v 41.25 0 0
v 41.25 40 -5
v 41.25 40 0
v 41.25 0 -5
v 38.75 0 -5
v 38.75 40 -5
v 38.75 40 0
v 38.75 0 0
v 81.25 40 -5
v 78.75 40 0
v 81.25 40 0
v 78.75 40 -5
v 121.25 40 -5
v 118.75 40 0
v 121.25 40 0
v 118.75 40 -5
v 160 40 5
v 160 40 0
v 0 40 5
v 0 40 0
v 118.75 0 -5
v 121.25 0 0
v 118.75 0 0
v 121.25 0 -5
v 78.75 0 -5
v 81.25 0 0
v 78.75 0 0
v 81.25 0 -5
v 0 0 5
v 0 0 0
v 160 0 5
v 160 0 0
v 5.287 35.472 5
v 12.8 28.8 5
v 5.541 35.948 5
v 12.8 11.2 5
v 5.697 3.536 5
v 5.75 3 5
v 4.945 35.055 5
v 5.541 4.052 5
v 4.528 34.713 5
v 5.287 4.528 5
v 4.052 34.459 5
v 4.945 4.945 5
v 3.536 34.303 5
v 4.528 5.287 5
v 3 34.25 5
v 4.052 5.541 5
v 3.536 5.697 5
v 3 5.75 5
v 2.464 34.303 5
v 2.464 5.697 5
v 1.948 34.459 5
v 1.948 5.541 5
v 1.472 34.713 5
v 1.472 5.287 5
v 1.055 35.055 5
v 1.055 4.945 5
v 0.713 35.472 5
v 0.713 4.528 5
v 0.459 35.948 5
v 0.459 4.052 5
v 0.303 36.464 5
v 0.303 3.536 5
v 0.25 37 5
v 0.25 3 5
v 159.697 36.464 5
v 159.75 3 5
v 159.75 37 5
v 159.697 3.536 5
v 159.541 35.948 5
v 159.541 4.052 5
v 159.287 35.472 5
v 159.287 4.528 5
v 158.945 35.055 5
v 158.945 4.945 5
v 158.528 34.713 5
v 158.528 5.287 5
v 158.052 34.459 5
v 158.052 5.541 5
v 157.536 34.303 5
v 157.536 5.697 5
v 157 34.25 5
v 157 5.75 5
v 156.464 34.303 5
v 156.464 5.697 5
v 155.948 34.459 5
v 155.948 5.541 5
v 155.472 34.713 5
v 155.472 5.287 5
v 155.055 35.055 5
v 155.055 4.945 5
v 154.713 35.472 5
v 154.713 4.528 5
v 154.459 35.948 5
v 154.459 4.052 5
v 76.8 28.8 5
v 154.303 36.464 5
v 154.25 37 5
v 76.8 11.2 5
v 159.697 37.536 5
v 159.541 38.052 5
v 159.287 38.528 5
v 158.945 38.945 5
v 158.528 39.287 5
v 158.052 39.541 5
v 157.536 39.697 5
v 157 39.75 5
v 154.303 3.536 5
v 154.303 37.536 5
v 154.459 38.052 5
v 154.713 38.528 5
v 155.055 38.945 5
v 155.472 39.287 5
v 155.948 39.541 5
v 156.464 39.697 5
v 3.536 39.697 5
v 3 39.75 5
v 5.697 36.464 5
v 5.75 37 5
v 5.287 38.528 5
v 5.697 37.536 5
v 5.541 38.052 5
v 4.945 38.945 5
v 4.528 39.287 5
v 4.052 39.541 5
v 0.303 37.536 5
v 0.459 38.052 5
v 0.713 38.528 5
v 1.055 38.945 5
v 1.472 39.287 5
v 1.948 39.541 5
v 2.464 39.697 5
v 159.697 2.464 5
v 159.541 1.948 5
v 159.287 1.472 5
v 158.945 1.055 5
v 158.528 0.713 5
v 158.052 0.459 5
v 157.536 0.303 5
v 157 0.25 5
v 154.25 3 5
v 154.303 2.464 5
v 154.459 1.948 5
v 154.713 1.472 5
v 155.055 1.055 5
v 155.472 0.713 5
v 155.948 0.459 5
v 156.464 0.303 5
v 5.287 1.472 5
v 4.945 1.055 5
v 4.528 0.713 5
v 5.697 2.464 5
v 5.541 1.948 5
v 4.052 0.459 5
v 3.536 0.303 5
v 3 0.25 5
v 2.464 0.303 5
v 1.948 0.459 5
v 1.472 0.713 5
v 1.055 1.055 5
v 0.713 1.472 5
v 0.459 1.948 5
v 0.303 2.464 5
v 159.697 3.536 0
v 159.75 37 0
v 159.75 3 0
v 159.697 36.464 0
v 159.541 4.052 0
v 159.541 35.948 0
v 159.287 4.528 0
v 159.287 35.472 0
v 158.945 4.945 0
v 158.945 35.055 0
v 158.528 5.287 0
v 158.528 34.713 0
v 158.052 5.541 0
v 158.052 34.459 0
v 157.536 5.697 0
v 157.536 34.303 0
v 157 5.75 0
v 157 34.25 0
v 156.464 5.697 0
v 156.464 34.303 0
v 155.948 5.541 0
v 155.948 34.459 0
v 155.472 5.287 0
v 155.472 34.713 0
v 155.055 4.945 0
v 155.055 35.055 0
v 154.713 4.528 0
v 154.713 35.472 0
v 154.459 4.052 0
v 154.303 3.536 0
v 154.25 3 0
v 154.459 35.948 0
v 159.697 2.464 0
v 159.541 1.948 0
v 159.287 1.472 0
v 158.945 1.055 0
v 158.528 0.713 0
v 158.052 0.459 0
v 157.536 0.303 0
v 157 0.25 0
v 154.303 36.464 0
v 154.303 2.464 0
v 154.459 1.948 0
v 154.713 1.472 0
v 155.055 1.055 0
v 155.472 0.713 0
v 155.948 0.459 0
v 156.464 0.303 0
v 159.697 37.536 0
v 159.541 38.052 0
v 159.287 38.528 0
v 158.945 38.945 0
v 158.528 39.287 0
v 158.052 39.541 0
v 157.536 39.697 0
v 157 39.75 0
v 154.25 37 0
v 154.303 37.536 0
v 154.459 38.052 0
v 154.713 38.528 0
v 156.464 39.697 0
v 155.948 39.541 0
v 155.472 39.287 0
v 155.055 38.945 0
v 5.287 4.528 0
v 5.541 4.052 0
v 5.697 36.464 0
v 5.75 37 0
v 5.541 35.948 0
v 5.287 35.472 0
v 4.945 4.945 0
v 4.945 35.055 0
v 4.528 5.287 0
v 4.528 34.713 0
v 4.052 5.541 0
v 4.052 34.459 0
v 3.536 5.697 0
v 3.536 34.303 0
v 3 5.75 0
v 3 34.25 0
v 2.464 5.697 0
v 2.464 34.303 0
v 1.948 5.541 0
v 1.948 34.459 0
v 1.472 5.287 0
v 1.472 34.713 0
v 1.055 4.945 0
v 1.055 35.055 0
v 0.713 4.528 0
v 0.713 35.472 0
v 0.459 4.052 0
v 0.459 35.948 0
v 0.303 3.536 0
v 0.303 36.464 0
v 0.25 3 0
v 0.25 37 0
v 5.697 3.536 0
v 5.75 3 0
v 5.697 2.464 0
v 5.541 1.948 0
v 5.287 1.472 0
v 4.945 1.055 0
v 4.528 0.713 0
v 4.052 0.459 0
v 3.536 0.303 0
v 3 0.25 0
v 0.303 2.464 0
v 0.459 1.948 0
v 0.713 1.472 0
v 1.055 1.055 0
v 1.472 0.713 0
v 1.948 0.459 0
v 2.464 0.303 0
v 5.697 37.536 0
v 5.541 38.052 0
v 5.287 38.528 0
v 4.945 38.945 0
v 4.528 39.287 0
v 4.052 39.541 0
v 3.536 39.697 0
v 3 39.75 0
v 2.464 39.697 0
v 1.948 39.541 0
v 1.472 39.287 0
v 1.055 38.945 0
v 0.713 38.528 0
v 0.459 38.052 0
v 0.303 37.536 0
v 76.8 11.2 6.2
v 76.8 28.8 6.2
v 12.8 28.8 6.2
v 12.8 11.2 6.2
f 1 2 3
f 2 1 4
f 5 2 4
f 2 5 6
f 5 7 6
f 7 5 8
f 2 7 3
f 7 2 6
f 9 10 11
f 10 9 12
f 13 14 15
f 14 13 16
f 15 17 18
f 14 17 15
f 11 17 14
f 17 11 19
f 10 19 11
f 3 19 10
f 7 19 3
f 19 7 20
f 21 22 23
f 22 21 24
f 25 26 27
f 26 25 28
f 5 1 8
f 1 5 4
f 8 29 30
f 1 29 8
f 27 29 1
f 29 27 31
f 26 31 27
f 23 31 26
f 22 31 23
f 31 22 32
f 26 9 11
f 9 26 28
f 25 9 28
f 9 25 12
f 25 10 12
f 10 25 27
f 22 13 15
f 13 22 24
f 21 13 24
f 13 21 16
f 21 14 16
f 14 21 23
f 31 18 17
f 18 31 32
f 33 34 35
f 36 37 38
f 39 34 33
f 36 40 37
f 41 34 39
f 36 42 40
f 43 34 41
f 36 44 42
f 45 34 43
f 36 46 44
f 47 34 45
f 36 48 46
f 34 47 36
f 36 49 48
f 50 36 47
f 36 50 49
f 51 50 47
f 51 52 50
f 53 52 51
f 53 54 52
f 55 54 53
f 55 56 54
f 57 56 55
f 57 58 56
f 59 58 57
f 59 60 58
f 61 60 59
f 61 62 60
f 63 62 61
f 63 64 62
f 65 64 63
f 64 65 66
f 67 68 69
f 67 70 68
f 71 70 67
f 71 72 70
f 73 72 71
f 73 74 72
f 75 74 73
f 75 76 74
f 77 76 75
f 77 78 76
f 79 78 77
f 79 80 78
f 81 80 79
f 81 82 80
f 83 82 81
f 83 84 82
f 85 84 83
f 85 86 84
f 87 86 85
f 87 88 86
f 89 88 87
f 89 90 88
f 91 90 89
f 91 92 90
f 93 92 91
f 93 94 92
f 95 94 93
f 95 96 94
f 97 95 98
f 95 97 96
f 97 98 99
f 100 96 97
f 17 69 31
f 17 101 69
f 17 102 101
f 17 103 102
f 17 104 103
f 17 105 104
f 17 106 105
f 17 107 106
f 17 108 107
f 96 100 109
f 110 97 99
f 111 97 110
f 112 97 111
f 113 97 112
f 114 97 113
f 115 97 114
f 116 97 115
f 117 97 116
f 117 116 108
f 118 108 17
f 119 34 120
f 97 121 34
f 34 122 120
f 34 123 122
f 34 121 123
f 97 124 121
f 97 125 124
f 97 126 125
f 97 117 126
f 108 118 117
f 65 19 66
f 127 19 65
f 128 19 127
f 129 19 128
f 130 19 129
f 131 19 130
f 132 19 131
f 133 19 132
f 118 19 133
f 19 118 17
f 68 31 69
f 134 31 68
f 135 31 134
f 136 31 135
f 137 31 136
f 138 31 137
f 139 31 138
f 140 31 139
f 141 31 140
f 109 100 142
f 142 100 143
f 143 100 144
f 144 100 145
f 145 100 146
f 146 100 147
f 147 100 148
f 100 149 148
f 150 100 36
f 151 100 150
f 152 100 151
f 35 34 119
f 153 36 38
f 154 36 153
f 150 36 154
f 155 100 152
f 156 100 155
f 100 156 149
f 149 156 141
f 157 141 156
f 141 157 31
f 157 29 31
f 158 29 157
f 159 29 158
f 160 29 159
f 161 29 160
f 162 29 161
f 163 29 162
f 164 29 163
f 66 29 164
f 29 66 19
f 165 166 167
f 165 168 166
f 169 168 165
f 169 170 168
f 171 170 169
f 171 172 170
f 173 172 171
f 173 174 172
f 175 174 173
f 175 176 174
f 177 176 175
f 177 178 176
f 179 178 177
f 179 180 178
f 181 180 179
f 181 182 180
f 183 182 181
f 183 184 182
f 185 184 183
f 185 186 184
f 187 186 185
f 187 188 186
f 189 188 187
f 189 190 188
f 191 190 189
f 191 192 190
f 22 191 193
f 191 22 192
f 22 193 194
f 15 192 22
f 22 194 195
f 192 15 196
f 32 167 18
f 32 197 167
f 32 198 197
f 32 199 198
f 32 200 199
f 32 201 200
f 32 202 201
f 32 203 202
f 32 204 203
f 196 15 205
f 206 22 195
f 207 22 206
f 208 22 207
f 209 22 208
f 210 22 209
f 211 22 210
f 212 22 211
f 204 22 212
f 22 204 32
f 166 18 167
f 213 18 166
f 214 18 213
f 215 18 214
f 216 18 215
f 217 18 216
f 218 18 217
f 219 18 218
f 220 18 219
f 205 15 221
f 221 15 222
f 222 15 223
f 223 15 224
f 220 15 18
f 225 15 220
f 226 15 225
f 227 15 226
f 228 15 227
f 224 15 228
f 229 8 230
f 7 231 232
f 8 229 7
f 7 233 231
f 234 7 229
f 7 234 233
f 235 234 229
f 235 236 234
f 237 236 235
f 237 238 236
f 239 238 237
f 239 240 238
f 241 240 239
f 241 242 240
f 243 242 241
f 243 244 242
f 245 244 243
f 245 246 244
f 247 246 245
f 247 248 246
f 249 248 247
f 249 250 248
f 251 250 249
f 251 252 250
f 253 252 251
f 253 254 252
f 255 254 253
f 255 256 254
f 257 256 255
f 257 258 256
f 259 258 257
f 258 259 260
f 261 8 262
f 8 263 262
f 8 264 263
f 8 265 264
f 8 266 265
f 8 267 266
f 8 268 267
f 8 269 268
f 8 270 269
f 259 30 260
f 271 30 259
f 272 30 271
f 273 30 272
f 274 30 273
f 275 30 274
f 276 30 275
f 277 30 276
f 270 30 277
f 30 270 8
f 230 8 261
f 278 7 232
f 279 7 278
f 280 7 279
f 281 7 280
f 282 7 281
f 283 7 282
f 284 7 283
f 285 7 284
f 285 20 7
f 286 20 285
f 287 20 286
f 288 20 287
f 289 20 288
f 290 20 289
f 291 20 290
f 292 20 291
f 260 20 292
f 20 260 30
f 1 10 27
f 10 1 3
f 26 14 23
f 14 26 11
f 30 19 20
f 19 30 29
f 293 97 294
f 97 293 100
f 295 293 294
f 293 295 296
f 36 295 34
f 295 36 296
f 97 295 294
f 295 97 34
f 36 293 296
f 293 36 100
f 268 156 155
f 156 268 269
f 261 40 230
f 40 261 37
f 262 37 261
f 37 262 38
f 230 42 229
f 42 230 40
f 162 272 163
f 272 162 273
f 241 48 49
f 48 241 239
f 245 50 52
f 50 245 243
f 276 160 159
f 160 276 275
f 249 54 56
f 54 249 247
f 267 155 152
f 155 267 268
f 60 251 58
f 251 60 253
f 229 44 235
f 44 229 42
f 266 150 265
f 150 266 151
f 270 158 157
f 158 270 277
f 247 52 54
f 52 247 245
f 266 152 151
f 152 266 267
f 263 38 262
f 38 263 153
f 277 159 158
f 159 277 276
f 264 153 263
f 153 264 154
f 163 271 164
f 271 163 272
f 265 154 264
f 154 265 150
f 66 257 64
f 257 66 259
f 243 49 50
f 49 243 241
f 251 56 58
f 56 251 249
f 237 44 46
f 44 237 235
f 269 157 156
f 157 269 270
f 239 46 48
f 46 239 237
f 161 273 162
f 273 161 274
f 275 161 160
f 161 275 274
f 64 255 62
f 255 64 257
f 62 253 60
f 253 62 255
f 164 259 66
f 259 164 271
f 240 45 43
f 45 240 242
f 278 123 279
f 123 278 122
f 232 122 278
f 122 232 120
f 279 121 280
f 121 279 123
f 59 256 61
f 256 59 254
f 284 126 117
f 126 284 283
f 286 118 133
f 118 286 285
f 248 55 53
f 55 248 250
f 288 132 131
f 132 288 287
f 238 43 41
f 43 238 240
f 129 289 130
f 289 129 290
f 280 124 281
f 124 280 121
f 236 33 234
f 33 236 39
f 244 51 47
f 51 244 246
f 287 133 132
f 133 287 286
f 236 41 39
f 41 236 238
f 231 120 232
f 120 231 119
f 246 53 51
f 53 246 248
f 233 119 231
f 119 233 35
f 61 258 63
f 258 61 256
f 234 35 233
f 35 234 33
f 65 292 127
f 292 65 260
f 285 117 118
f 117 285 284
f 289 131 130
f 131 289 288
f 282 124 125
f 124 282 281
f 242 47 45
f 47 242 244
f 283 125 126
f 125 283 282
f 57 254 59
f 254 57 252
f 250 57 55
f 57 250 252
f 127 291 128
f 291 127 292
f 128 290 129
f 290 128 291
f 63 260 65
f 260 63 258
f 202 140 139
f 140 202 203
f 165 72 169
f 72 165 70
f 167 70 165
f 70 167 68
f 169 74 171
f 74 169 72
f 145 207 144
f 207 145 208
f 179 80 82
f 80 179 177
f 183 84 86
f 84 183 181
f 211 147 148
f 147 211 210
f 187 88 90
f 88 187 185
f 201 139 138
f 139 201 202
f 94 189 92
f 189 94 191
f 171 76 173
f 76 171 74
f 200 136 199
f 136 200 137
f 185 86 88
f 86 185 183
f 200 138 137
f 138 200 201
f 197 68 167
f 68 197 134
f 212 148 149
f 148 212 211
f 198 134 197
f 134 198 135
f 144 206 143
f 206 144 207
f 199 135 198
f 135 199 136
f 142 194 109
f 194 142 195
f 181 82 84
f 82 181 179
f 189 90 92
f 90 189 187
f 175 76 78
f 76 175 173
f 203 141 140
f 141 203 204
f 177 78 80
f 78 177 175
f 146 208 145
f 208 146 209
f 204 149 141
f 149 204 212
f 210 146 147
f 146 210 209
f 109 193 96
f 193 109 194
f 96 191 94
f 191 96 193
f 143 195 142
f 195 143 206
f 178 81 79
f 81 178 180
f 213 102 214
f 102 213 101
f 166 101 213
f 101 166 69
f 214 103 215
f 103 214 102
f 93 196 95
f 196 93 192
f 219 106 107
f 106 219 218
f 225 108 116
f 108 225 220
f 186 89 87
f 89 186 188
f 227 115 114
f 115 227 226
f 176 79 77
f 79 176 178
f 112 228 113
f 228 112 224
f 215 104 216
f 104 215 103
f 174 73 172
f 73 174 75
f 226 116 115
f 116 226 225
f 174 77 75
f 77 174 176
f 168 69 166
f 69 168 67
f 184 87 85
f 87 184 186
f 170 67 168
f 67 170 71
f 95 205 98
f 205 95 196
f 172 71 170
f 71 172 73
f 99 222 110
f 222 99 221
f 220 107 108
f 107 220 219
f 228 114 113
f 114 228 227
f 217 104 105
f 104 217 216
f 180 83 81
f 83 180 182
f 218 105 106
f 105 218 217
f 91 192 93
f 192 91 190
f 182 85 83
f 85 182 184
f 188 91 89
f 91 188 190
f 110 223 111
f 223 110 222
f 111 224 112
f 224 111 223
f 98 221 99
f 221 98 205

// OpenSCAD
$fn = 32;

// ----------------------------------------------------------------------
// Enclosure lid: 160 x 40 x 5 mm, 4 bolt holes
// ----------------------------------------------------------------------

// --- parameters (mm) ---
length = 160;             // lid length, X
width = 40;               // lid width, Y
plate_t = 5;              // lid plate thickness
bolt_d = 5.5;             // bolt clearance
boss_lip = 3;             // bolt hole inset from the corner
sink = 1;                 // overlap of the lip and ribs into the plate
rib_n = 3;                // stiffening ribs
rib_t = 2.5;              // rib thickness
rib_h = 6;                // rib height below the plate
label_h = 1.2;            // raised marking pad

module plate() {
  cube([length, width, plate_t]);
  /* stiffening ribs under the plate */
  for (i = [1 : rib_n]) translate([length * i / (rib_n + 1) - rib_t / 2, 0, -rib_h + sink]) cube([rib_t, width - 2 * 0, rib_h]);
  /* raised marking pad on top, sunk 1 mm into the plate */
  translate([length * 0.08, width * 0.28, plate_t - 1]) cube([length * 0.4, width * 0.44, label_h + 1]);
}

difference() {
  plate();
  /* bolt pattern matching the corner bosses */
  for (sx = [0, 1]) for (sy = [0, 1])
    translate([sx * (length - 2 * boss_lip) + boss_lip, sy * (width - 2 * boss_lip) + boss_lip, -0 - 1])
      cylinder(h = plate_t + 0 + 2, d = bolt_d);
}
